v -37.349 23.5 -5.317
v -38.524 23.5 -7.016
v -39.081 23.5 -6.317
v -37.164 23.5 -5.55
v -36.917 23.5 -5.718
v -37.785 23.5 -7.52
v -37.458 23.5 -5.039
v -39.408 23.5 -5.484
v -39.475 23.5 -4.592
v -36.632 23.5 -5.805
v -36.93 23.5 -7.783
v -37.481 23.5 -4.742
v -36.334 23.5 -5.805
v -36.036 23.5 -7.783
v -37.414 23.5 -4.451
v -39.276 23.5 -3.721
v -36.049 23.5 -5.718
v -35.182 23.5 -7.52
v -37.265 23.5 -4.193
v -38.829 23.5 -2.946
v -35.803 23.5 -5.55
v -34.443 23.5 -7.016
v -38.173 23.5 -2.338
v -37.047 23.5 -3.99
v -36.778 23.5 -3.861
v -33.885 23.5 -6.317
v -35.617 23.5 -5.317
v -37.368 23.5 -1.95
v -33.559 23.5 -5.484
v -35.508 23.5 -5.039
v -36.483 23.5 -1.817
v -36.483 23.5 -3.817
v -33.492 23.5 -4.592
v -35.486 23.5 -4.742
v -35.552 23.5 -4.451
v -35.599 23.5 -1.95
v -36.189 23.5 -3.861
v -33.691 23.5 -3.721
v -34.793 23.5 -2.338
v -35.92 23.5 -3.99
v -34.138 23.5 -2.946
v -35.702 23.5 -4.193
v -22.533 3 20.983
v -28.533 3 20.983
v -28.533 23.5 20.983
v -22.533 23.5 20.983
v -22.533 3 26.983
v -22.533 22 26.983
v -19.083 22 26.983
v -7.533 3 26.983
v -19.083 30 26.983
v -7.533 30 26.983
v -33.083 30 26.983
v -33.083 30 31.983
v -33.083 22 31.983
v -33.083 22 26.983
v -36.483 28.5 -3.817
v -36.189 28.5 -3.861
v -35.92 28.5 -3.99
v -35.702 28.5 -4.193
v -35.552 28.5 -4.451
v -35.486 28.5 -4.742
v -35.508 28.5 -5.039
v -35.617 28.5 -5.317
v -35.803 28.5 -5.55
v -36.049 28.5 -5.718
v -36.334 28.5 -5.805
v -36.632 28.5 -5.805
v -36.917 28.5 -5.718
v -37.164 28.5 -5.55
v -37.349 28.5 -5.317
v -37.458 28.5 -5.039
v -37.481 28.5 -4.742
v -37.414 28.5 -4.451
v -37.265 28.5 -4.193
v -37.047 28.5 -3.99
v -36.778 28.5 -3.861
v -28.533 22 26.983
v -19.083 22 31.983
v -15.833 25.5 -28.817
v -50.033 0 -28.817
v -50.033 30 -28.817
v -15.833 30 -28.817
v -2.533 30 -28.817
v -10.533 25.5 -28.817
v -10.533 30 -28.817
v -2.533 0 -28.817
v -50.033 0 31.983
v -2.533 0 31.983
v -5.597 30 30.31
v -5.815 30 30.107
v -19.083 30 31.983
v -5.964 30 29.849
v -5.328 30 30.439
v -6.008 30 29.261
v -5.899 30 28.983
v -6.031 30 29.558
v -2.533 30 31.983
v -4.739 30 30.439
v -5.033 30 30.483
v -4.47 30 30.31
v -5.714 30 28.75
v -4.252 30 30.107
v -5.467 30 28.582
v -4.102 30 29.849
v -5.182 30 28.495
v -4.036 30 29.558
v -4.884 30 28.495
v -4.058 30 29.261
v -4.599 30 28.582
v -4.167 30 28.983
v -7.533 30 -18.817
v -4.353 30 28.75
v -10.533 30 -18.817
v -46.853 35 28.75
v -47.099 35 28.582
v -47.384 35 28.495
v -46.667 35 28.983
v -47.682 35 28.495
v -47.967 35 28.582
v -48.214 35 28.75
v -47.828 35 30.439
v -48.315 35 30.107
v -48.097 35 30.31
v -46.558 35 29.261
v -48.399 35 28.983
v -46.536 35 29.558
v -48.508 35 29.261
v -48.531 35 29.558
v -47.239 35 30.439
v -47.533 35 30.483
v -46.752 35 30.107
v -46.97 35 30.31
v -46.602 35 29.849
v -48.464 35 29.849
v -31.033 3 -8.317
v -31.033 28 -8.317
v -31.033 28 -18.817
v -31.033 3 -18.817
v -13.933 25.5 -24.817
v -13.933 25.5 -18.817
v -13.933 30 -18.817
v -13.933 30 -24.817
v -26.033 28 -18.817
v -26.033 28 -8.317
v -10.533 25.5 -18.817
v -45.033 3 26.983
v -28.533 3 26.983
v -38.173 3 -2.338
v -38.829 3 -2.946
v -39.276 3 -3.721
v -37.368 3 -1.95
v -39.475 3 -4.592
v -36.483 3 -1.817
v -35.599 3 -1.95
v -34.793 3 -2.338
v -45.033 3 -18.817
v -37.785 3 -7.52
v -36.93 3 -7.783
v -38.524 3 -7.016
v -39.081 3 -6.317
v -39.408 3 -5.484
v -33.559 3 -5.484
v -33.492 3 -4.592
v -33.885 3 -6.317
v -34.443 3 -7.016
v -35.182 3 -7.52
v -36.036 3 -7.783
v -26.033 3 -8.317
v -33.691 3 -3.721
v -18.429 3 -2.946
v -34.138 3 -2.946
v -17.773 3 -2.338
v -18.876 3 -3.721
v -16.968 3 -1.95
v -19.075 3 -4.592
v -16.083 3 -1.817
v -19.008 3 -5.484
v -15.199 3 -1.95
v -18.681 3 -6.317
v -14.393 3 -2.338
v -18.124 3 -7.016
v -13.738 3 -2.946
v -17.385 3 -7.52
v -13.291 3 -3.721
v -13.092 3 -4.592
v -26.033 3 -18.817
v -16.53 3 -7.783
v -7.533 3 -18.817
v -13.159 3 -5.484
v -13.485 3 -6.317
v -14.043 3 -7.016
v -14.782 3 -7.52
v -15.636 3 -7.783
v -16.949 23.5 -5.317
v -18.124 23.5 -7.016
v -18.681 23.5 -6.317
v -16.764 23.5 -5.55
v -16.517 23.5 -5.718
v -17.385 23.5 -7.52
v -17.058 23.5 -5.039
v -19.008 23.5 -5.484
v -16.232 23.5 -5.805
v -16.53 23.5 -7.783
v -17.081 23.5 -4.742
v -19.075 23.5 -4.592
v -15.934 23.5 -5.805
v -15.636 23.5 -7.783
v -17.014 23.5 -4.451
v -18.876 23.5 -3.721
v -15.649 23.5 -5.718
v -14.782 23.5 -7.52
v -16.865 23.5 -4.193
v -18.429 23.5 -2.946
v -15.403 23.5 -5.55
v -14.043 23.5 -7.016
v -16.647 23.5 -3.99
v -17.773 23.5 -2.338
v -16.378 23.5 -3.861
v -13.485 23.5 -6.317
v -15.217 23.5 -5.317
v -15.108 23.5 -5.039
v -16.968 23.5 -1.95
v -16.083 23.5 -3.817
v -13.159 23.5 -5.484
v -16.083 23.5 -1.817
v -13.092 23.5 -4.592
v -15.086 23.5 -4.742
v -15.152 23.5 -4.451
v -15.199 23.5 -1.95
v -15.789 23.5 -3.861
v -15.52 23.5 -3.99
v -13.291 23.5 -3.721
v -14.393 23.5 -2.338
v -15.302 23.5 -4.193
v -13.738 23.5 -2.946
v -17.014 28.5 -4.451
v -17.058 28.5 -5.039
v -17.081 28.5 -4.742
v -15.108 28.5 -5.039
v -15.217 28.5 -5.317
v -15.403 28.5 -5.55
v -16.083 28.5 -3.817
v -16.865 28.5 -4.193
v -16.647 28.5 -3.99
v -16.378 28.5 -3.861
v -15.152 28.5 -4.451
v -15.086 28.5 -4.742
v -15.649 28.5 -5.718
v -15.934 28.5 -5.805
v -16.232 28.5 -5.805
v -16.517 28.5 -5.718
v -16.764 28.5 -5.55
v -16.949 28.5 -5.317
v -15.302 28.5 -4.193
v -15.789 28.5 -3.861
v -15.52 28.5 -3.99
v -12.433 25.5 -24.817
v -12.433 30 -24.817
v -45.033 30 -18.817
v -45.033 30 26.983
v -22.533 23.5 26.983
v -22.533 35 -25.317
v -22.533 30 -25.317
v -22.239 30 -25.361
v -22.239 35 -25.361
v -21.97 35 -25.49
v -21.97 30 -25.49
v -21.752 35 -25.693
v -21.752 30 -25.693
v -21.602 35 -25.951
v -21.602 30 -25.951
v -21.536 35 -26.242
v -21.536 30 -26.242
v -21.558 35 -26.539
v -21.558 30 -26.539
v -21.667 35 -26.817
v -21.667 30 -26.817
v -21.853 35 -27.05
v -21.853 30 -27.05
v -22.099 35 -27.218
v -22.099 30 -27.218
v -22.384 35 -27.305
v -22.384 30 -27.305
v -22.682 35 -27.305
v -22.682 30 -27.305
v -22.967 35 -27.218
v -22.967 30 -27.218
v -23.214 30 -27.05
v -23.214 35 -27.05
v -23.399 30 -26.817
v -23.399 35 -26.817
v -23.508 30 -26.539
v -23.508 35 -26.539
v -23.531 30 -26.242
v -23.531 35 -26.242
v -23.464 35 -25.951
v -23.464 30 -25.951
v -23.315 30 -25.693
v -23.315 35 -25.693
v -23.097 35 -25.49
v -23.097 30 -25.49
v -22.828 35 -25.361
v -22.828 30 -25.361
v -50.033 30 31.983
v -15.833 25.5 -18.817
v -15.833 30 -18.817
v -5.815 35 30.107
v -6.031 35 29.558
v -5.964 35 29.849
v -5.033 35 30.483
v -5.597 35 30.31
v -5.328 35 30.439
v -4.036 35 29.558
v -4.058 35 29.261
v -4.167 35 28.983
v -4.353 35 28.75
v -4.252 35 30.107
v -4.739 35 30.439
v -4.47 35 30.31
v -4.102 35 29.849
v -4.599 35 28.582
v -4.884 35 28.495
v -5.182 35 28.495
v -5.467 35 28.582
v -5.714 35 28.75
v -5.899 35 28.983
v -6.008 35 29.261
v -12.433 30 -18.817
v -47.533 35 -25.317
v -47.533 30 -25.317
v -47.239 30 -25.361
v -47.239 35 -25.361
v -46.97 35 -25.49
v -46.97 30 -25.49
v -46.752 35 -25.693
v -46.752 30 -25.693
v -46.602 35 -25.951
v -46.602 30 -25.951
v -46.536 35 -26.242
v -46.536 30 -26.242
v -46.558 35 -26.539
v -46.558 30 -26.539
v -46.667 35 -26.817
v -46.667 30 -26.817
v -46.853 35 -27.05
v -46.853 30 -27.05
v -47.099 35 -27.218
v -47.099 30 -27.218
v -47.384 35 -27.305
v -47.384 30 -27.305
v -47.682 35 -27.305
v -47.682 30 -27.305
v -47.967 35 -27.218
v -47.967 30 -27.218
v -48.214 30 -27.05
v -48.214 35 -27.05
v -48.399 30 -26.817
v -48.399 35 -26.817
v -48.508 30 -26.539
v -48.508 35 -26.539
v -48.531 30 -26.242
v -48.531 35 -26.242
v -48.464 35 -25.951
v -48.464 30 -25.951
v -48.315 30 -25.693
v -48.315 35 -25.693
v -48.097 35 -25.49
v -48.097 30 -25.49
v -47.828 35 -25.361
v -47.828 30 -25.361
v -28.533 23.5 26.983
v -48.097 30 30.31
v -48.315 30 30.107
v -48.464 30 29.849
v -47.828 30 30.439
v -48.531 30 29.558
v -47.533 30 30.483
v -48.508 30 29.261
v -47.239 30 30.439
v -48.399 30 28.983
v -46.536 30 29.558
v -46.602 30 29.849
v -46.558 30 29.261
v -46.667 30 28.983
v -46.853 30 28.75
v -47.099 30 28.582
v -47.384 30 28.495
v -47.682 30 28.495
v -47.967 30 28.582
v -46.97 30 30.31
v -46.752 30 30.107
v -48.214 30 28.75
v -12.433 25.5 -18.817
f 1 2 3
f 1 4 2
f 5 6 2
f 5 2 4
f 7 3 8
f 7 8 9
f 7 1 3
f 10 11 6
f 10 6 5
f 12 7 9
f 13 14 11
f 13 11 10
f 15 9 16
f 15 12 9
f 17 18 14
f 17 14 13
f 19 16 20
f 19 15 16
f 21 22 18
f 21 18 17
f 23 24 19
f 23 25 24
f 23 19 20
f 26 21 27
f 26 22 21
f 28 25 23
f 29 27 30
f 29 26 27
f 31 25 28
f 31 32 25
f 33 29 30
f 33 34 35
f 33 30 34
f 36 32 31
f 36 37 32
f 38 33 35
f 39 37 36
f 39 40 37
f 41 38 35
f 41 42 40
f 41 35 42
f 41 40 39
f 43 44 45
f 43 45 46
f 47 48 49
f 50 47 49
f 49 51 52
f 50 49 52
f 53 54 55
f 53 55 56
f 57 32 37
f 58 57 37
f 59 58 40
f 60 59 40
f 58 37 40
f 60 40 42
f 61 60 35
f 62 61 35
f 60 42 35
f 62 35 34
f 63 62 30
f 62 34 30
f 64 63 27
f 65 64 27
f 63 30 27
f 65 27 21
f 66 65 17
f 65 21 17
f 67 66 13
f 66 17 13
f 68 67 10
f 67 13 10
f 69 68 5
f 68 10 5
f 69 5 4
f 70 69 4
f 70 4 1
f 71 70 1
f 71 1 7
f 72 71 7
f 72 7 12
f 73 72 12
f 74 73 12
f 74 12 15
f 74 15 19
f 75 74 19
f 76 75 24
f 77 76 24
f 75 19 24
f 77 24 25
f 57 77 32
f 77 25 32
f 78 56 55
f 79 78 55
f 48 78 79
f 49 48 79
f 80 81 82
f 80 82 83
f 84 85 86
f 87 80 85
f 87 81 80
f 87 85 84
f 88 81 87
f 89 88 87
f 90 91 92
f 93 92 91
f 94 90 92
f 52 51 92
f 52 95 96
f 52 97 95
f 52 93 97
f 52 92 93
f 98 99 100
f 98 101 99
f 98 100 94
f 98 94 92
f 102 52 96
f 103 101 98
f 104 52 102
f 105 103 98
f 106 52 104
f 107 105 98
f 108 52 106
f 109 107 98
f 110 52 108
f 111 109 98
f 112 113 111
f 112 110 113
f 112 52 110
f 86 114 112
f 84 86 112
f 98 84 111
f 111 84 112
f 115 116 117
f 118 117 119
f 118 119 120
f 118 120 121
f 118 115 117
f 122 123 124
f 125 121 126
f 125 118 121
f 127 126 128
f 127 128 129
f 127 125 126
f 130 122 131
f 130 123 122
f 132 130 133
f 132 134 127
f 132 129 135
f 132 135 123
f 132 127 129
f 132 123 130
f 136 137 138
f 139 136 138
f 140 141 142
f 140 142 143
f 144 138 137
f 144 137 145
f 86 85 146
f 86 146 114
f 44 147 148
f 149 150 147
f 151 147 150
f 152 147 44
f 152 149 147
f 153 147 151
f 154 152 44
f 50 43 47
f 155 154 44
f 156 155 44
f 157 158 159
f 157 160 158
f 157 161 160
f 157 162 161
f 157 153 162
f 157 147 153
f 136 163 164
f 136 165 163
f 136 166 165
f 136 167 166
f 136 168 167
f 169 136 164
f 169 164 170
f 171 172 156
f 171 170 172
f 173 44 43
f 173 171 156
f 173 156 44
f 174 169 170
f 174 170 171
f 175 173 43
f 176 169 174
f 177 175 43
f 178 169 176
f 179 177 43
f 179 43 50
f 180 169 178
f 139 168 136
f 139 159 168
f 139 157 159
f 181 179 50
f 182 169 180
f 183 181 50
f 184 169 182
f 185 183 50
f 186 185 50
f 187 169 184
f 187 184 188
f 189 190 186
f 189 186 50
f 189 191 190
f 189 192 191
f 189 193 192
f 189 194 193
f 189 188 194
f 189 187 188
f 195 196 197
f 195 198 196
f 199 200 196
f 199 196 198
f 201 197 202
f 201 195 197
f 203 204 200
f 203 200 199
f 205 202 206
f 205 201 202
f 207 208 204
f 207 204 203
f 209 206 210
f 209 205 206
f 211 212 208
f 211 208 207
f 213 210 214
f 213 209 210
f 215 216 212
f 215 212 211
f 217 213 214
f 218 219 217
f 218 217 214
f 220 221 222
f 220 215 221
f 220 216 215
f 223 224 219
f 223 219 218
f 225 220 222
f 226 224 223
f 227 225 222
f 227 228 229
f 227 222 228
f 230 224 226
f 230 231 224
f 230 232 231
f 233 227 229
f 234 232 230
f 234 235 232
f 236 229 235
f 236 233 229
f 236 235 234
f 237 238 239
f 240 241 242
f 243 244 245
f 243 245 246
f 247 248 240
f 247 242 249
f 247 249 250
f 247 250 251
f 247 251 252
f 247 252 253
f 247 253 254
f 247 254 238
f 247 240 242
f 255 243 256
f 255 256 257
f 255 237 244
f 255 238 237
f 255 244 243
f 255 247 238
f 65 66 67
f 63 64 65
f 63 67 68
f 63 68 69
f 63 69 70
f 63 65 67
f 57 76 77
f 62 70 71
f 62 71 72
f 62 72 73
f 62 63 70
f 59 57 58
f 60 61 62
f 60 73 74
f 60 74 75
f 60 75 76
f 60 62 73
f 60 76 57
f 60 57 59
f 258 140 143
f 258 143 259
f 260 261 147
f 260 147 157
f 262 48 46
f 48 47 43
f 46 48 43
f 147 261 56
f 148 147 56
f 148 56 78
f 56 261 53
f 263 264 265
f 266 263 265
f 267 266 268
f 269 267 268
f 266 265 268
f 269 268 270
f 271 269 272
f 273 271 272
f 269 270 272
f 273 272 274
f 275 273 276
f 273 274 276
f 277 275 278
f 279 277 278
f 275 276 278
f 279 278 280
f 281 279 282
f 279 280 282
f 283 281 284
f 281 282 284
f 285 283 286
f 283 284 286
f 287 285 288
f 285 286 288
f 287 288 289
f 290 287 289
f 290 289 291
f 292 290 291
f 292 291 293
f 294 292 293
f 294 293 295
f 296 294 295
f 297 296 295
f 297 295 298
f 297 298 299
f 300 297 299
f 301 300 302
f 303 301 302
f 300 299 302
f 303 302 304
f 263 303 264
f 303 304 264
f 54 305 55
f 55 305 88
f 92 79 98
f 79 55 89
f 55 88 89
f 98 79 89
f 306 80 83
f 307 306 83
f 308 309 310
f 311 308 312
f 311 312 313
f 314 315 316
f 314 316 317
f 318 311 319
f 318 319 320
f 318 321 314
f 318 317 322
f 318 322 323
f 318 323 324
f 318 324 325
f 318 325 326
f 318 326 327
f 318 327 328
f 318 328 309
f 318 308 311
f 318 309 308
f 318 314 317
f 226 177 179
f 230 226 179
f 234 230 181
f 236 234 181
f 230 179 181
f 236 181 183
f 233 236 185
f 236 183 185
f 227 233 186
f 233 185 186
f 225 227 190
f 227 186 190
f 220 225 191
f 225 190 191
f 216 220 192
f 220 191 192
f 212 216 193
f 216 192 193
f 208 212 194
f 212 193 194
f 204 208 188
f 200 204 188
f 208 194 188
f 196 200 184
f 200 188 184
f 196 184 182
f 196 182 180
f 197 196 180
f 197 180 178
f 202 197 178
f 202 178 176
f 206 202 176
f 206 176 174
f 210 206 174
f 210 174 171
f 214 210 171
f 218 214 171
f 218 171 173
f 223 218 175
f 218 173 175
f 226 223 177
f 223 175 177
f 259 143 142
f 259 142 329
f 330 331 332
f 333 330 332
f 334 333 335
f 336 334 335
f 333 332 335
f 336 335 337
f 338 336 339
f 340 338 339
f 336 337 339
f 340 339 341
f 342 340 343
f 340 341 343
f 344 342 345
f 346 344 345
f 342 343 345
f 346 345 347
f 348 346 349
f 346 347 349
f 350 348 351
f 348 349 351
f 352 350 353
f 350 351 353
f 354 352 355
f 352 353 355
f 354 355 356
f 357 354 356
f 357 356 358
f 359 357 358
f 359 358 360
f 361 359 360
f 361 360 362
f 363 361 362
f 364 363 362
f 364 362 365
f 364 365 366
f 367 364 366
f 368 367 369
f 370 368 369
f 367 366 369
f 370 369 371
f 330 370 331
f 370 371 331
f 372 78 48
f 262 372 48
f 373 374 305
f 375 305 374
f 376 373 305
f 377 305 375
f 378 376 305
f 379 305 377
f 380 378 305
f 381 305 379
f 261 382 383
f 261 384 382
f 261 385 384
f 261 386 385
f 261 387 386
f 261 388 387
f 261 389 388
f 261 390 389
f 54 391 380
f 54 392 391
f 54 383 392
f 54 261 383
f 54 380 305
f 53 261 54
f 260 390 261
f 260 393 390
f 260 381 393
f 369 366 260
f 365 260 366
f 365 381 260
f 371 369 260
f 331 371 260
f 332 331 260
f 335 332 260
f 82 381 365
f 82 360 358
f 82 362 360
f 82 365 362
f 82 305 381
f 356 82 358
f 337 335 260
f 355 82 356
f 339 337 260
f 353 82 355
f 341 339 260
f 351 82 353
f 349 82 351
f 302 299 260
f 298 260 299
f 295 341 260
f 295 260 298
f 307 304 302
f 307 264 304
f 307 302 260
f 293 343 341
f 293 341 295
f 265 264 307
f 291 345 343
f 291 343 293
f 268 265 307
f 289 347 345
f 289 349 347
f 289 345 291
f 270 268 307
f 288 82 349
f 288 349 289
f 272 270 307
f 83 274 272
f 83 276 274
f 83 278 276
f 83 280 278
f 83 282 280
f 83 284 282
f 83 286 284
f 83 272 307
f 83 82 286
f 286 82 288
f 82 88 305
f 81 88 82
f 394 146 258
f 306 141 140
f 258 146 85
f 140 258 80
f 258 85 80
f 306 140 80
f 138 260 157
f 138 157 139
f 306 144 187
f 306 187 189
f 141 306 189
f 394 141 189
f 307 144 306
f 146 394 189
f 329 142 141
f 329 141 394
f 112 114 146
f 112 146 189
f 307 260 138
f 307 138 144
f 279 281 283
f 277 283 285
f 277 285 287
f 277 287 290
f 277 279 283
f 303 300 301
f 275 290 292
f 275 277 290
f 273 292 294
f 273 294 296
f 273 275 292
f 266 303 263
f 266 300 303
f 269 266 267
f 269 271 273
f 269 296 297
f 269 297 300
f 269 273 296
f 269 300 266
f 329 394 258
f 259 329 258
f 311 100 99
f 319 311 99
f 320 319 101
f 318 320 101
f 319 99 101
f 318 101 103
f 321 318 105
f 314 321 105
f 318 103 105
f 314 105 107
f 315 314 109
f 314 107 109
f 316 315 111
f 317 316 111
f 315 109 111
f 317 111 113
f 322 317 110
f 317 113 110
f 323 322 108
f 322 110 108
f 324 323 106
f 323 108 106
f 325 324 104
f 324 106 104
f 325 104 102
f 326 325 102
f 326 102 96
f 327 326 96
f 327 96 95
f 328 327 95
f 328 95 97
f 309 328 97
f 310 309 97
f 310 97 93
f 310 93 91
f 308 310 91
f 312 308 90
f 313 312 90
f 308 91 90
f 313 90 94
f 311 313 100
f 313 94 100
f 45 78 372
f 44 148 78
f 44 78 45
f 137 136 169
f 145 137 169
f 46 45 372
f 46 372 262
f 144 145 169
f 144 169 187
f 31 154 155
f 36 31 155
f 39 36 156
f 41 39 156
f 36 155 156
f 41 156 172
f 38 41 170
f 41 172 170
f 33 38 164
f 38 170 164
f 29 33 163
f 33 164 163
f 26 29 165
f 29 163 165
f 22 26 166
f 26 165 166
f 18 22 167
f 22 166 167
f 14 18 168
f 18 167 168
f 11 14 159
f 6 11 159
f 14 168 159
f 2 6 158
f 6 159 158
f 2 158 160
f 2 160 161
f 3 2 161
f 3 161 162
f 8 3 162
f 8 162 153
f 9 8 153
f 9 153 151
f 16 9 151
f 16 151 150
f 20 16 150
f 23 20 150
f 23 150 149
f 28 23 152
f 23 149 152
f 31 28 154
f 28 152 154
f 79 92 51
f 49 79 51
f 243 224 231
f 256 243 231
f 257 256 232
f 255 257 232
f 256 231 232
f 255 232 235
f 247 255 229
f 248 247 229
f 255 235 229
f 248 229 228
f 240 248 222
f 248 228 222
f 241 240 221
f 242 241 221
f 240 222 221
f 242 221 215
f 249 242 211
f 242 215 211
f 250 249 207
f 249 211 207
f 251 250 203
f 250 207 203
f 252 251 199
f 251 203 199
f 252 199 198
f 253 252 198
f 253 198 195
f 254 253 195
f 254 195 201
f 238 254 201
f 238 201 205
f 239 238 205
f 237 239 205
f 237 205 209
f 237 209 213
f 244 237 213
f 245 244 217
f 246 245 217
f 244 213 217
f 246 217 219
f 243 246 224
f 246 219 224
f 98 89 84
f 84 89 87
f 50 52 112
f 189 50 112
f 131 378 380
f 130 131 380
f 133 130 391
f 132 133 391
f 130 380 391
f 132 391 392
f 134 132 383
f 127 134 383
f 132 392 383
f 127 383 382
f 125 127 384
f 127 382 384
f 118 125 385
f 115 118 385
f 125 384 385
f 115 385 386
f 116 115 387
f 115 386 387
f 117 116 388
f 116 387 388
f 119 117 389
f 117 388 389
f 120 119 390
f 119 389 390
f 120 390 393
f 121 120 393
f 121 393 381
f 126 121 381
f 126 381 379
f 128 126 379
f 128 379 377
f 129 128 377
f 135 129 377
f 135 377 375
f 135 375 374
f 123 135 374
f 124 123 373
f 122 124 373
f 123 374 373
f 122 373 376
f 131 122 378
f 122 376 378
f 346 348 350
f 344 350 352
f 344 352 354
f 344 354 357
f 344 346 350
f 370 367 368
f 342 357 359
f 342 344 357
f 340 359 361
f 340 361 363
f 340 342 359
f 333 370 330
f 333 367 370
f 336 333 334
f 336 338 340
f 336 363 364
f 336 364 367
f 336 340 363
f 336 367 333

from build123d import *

# Parameters (mm, degrees)
SKETCH_1_W          = 47.5
SKETCH_1_H          = 60.8
EXTRUDE_1_DEPTH     = 30
SKETCH_2_R          = 1
EXTRUDE_3_DEPTH     = 5
SKETCH_3_W          = 37.5
SKETCH_3_H          = 45.8
CUT_EXTRUDE_1_DEPTH = 27
SKETCH_4_W          = 14
SKETCH_4_H          = 5
CUT_EXTRUDE_2_DEPTH = 8
SKETCH_5_R          = 3
SKETCH_5_W          = 6
SKETCH_5_H          = 6
EXTRUDE_4_DEPTH     = 20.5
SKETCH_6_W          = 5
SKETCH_6_H          = 10.5
EXTRUDE_6_DEPTH     = 25
SKETCH_7_R          = 1
EXTRUDE_7_DEPTH     = 5
SKETCH_12_W         = 5.3
SKETCH_12_H         = 4.5
CUT_EXTRUDE_5_DEPTH = 10
SKETCH_13_W         = 1.5
SKETCH_13_H         = 6
EXTRUDE_8_DEPTH     = 4.5


with BuildPart() as part:
    # 草图1 → 凸台-拉伸1 (new body)
    with BuildSketch(Plane(origin=(0, 0, 0), x_dir=(1, 0, 0), z_dir=(0, 1, 0))):
        with Locations((-26.283333333, -1.583333333)):
            Rectangle(SKETCH_1_W, SKETCH_1_H)
    extrude(amount=EXTRUDE_1_DEPTH)

    # 草图2 → 凸台-拉伸3 (add)
    with BuildSketch(Plane(origin=(0, 30, 0), x_dir=(1, 0, 0), z_dir=(0, 1, 0))):
        with Locations(Location((-22.533333333, 26.316666667, 0), (0, 0, 270))):
            Circle(SKETCH_2_R)
        with Locations(Location((-47.533333333, 26.316666667, 0), (0, 0, 270))):
            Circle(SKETCH_2_R)
        with Locations(Location((-47.533333333, -29.483333333, 0), (0, 0, 270))):
            Circle(SKETCH_2_R)
        with Locations(Location((-5.033333333, -29.483333333, 0), (0, 0, 270))):
            Circle(SKETCH_2_R)
    extrude(amount=EXTRUDE_3_DEPTH)

    # 草图3 → 切除-拉伸1 (cut)
    with BuildSketch(Plane(origin=(0, 30, 0), x_dir=(1, 0, 0), z_dir=(0, 1, 0))):
        with Locations((-26.283333333, -4.083333333)):
            Rectangle(SKETCH_3_W, SKETCH_3_H)
    extrude(amount=-CUT_EXTRUDE_1_DEPTH, mode=Mode.SUBTRACT)

    # 草图4 → 切除-拉伸2 (cut)
    with BuildSketch(Plane(origin=(0, 30, 0), x_dir=(1, 0, 0), z_dir=(0, 1, 0))):
        with Locations((-26.083333333, -29.483333333)):
            Rectangle(SKETCH_4_W, SKETCH_4_H)
    extrude(amount=-CUT_EXTRUDE_2_DEPTH, mode=Mode.SUBTRACT)

    # 草图5 → 凸台-拉伸4 (add)
    with BuildSketch(Plane(origin=(0, 3, 0), x_dir=(1, 0, 0), z_dir=(0, 1, 0))):
        with Locations(Location((-16.083333333, 4.816666667, 0), (0, 0, 270))):
            Circle(SKETCH_5_R)
        with Locations(Location((-36.483333333, 4.816666667, 0), (0, 0, 270))):
            Circle(SKETCH_5_R)
        with Locations((-25.533333333, -23.983333333)):
            Rectangle(SKETCH_5_W, SKETCH_5_H)
    extrude(amount=EXTRUDE_4_DEPTH)

    # 草图6 → 凸台-拉伸6 (add)
    with BuildSketch(Plane(origin=(0, 3, 0), x_dir=(1, 0, 0), z_dir=(0, 1, 0))):
        with Locations((-28.533333333, 13.566666667)):
            Rectangle(SKETCH_6_W, SKETCH_6_H)
    extrude(amount=EXTRUDE_6_DEPTH)

    # 草图7 → 凸台-拉伸7 (add)
    with BuildSketch(Plane(origin=(0, 23.5, 0), x_dir=(1, 0, 0), z_dir=(0, 1, 0))):
        with Locations(Location((-36.483333333, 4.816666667, 0), (0, 0, 270))):
            Circle(SKETCH_7_R)
        with Locations(Location((-16.083333333, 4.816666667, 0), (0, 0, 270))):
            Circle(SKETCH_7_R)
    extrude(amount=EXTRUDE_7_DEPTH)

    # 草图12 → 切除-拉伸5 (cut)
    with BuildSketch(Plane(origin=(0, 0, -28.816666667), x_dir=(-1, 0, 0), z_dir=(0, 0, -1))):
        with Locations((13.183333333, 27.75)):
            Rectangle(SKETCH_12_W, SKETCH_12_H)
    extrude(amount=-CUT_EXTRUDE_5_DEPTH, mode=Mode.SUBTRACT)

    # 草图13 → 凸台-拉伸8 (add)
    with BuildSketch(Plane(origin=(0, 25.5, 0), x_dir=(1, 0, 0), z_dir=(0, 1, 0))):
        with Locations((-13.183333333, 21.816666667)):
            Rectangle(SKETCH_13_W, SKETCH_13_H)
    extrude(amount=EXTRUDE_8_DEPTH)


solid = part.part
